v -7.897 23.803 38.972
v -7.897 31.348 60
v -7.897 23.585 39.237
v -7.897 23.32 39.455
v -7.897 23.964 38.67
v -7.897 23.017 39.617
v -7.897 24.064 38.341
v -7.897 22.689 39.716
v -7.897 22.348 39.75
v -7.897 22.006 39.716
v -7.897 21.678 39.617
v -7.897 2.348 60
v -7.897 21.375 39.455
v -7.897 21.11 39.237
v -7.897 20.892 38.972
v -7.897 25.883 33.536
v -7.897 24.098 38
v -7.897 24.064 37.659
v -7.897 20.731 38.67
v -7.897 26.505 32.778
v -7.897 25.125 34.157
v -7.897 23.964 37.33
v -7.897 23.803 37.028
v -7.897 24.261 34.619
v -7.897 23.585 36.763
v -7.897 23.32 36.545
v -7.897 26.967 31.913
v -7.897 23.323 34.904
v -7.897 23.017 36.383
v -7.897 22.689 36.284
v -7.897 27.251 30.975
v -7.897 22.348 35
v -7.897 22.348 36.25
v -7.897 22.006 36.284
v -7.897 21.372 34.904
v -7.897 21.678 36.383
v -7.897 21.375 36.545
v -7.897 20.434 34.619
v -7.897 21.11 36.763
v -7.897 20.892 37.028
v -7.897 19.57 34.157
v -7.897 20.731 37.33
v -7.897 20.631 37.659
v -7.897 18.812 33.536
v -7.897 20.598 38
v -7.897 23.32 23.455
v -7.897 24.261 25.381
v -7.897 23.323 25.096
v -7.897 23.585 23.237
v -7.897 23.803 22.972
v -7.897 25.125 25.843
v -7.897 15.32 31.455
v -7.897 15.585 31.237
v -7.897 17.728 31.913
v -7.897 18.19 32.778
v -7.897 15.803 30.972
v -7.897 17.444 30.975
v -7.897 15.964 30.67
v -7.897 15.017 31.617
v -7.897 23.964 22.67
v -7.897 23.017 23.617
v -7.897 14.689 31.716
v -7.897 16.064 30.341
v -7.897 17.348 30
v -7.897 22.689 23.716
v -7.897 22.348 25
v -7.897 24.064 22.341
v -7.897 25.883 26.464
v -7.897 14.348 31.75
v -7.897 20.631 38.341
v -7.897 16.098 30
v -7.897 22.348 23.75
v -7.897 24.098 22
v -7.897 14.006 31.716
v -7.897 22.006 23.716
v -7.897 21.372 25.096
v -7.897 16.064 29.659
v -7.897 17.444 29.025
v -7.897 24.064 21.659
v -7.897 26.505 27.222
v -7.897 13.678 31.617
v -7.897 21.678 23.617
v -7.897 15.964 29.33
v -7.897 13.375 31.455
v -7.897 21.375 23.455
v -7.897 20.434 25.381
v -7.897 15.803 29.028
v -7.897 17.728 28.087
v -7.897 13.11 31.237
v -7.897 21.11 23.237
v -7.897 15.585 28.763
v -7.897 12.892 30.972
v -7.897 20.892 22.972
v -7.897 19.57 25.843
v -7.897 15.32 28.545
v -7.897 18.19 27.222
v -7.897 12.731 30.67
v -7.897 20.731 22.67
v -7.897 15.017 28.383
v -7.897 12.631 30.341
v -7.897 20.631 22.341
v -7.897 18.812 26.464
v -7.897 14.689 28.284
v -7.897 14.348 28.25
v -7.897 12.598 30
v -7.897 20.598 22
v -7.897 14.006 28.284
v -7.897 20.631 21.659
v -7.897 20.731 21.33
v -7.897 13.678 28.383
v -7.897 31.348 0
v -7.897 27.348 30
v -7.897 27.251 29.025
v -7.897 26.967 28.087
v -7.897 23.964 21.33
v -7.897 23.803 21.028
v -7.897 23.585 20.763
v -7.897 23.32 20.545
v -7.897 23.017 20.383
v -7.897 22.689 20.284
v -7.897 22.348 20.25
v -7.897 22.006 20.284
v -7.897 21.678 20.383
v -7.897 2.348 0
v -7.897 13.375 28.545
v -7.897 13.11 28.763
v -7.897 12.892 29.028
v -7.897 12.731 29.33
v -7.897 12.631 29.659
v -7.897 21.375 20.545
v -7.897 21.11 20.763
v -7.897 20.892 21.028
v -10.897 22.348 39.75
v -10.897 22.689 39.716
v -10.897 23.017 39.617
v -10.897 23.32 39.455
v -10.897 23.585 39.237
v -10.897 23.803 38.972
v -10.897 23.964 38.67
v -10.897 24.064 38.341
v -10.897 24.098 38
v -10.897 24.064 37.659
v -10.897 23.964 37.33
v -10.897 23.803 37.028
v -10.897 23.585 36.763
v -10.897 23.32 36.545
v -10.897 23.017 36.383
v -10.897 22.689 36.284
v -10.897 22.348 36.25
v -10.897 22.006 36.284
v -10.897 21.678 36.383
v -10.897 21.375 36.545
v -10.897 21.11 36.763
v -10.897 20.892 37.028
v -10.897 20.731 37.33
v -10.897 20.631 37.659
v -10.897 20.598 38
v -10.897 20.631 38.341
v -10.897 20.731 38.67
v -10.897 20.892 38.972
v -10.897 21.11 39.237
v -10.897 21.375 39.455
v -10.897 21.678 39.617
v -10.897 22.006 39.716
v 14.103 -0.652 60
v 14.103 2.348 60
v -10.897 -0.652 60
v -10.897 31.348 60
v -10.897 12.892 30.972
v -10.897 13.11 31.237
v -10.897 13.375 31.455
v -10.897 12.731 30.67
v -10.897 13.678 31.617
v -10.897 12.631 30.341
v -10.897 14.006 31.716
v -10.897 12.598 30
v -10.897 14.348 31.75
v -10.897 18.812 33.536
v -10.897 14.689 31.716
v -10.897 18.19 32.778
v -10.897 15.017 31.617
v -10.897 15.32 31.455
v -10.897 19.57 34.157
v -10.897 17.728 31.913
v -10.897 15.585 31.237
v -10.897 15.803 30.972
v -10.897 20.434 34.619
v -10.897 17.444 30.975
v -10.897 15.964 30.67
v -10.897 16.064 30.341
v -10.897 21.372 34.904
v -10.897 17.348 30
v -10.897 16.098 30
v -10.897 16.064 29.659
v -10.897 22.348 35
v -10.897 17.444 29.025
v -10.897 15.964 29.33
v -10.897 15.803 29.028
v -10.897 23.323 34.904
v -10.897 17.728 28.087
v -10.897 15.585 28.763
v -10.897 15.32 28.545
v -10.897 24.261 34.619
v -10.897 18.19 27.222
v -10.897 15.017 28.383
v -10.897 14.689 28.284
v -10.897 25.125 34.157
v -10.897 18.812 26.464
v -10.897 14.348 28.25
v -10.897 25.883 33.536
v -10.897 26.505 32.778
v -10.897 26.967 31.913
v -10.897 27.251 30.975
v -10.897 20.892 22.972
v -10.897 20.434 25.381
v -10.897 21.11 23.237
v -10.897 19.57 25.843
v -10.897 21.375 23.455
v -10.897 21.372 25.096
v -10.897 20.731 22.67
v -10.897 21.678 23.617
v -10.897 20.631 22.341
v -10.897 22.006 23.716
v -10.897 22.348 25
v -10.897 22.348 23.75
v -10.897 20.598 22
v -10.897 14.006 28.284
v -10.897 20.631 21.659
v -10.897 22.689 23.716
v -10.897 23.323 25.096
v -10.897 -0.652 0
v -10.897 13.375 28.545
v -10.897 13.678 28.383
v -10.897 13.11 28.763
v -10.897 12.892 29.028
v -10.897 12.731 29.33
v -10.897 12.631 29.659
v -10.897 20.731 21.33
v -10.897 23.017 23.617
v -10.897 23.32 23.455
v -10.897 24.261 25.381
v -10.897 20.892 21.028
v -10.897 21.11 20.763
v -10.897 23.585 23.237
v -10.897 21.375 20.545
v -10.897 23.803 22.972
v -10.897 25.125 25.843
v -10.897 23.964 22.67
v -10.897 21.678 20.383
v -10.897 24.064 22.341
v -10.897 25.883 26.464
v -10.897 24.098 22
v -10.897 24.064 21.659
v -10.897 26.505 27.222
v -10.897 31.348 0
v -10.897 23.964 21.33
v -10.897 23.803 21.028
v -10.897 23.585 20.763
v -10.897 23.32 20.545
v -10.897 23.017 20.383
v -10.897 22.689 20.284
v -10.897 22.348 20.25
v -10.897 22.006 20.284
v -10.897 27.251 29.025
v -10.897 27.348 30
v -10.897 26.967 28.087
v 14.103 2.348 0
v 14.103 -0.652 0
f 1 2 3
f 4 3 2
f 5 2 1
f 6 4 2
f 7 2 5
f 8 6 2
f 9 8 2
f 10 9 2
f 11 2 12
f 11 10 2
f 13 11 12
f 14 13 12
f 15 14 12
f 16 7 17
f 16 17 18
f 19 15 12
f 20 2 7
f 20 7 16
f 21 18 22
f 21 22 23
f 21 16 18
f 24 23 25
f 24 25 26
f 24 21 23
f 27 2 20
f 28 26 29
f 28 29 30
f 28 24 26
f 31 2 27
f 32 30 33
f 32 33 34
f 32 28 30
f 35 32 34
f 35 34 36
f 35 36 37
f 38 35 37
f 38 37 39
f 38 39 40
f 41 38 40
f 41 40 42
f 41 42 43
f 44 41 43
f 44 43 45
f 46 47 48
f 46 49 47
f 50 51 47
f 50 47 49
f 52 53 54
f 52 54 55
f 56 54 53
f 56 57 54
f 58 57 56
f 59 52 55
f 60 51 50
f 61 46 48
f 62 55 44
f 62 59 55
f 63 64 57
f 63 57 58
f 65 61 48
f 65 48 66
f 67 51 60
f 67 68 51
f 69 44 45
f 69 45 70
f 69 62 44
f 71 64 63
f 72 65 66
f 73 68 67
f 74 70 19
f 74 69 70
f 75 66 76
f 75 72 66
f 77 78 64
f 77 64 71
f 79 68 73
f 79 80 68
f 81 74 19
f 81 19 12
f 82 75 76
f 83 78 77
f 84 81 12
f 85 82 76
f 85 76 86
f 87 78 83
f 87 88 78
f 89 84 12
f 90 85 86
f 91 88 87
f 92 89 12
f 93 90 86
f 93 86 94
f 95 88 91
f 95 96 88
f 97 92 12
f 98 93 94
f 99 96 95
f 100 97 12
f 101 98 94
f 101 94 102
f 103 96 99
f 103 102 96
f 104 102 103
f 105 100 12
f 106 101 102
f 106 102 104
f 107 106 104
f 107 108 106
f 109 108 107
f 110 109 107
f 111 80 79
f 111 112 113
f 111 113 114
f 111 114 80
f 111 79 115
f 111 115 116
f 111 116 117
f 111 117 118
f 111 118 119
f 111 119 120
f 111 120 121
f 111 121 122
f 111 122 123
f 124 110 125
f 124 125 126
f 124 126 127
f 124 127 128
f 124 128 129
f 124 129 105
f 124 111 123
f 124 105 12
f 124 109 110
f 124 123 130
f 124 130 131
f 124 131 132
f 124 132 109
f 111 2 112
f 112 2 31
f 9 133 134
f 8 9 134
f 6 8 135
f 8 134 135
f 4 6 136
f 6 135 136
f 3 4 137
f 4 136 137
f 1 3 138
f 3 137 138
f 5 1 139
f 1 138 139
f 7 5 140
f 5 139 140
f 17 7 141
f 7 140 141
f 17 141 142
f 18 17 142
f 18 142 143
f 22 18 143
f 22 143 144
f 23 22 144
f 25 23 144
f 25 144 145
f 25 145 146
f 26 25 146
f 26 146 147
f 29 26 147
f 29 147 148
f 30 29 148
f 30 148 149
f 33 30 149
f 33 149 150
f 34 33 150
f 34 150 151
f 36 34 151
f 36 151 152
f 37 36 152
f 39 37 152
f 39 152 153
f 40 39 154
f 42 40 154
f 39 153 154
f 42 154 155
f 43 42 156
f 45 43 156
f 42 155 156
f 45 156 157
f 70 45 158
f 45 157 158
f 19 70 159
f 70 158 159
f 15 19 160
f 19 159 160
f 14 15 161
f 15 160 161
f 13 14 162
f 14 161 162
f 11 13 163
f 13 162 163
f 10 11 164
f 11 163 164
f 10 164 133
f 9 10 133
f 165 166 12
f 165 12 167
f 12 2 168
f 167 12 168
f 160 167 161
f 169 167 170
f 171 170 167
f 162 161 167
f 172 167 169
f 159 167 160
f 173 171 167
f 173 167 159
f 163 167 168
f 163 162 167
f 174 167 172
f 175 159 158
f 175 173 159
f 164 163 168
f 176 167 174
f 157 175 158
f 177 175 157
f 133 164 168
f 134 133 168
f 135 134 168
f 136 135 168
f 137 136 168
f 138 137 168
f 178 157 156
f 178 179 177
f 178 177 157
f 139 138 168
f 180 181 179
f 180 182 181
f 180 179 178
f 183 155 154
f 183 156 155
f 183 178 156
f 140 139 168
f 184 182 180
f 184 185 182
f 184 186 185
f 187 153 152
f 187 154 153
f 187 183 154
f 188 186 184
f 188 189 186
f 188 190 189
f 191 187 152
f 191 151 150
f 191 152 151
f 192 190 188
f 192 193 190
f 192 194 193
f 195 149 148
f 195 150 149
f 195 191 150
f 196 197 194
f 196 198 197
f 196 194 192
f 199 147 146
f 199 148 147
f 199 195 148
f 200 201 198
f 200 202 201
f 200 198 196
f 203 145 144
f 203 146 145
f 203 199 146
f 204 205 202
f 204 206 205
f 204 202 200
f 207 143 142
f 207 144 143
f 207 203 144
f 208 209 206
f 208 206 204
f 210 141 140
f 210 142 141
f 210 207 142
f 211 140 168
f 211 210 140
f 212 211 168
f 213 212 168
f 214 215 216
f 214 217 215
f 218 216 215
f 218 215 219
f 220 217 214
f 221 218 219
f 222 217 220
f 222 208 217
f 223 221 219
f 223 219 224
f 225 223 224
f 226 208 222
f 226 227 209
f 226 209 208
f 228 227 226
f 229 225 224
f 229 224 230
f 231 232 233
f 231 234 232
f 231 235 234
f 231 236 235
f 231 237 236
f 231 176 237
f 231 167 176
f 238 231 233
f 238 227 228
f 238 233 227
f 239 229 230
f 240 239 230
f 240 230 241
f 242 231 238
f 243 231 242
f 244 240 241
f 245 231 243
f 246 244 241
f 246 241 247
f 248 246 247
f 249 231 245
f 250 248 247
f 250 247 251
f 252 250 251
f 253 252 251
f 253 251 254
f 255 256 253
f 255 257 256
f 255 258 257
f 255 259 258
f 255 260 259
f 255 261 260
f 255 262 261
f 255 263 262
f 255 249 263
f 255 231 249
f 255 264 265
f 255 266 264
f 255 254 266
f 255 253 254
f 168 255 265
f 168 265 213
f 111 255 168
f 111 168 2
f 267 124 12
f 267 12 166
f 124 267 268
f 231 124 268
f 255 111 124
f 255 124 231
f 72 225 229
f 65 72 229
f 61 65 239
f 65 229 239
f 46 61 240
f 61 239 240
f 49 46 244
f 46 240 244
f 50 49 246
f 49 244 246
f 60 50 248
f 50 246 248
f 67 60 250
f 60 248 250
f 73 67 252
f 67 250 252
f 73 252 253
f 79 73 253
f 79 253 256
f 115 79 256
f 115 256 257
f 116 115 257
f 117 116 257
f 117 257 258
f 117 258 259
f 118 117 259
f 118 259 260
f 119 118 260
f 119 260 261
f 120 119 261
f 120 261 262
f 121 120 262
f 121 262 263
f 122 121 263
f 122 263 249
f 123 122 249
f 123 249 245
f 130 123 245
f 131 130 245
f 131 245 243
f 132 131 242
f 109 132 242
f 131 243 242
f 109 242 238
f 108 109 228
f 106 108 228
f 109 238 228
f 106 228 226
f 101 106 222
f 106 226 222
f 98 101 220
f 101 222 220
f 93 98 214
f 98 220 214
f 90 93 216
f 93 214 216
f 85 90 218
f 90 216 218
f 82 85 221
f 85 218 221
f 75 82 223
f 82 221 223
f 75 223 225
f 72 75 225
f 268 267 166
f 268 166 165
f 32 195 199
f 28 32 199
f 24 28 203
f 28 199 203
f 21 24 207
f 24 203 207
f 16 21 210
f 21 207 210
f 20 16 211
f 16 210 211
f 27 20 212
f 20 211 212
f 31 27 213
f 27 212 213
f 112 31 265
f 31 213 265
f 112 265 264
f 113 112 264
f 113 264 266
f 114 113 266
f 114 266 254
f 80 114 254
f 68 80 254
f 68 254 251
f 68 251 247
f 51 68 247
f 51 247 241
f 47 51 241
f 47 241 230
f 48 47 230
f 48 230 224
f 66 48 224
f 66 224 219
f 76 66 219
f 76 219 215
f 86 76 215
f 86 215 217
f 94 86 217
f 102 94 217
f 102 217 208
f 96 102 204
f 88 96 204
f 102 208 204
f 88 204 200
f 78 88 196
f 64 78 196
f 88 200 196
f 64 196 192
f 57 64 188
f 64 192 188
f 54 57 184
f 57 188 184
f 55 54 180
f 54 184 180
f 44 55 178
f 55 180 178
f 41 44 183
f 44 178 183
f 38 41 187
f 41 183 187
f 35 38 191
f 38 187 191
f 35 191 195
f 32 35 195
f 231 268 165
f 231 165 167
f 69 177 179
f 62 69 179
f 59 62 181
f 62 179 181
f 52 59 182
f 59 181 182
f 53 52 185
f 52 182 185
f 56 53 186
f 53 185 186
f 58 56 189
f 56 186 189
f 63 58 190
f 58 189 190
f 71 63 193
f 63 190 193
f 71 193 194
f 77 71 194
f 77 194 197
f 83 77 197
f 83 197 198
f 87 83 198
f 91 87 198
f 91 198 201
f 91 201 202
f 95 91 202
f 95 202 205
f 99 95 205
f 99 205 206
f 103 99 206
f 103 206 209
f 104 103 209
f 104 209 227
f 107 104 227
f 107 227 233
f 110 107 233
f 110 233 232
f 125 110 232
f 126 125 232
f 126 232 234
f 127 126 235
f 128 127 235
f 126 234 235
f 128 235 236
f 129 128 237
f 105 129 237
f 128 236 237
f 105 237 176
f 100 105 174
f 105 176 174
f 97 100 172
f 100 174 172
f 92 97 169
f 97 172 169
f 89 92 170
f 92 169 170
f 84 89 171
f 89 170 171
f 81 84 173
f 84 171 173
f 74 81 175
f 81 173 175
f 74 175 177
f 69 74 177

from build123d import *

# Parameters (mm, degrees)
BOSS_EXTRUDE1_DEPTH            = 60
HOLE_FOR_M5_300_SC_NUTS_SP_1_D = 10
HOLE_FOR_M5_300_SC_NUTS_SP_2_D = 3.5


with BuildPart() as part:
    # Sketch1 → Boss-Extrude1 (new body)
    with BuildSketch(Plane.XY):
        Polygon((-7.897485035, 31.347562808), (-7.897485035, 2.347562808), (14.102514965, 2.347562808), (14.102514965, -0.652437192), (-10.897485035, -0.652437192), (-10.897485035, 31.347562808), align=None)
    extrude(amount=BOSS_EXTRUDE1_DEPTH)

    # Hole for M5 300® SC Nuts (SP)1 (through all)
    with Locations(Plane(origin=(-7.897485035, 0, 0), x_dir=(0, 0, -1), z_dir=(1, 0, 0))):
        with Locations((-30, 22.347562808)):
            Hole(HOLE_FOR_M5_300_SC_NUTS_SP_1_D / 2)

    # Hole for M5 300® SC Nuts (SP)2 (through all)
    with Locations(Plane(origin=(-7.897485035, 0, 0), x_dir=(0, 0, -1), z_dir=(1, 0, 0))):
        with Locations((-22, 22.347562808), (-38, 22.347562808), (-30, 14.347562808)):
            Hole(HOLE_FOR_M5_300_SC_NUTS_SP_2_D / 2)


solid = part.part
